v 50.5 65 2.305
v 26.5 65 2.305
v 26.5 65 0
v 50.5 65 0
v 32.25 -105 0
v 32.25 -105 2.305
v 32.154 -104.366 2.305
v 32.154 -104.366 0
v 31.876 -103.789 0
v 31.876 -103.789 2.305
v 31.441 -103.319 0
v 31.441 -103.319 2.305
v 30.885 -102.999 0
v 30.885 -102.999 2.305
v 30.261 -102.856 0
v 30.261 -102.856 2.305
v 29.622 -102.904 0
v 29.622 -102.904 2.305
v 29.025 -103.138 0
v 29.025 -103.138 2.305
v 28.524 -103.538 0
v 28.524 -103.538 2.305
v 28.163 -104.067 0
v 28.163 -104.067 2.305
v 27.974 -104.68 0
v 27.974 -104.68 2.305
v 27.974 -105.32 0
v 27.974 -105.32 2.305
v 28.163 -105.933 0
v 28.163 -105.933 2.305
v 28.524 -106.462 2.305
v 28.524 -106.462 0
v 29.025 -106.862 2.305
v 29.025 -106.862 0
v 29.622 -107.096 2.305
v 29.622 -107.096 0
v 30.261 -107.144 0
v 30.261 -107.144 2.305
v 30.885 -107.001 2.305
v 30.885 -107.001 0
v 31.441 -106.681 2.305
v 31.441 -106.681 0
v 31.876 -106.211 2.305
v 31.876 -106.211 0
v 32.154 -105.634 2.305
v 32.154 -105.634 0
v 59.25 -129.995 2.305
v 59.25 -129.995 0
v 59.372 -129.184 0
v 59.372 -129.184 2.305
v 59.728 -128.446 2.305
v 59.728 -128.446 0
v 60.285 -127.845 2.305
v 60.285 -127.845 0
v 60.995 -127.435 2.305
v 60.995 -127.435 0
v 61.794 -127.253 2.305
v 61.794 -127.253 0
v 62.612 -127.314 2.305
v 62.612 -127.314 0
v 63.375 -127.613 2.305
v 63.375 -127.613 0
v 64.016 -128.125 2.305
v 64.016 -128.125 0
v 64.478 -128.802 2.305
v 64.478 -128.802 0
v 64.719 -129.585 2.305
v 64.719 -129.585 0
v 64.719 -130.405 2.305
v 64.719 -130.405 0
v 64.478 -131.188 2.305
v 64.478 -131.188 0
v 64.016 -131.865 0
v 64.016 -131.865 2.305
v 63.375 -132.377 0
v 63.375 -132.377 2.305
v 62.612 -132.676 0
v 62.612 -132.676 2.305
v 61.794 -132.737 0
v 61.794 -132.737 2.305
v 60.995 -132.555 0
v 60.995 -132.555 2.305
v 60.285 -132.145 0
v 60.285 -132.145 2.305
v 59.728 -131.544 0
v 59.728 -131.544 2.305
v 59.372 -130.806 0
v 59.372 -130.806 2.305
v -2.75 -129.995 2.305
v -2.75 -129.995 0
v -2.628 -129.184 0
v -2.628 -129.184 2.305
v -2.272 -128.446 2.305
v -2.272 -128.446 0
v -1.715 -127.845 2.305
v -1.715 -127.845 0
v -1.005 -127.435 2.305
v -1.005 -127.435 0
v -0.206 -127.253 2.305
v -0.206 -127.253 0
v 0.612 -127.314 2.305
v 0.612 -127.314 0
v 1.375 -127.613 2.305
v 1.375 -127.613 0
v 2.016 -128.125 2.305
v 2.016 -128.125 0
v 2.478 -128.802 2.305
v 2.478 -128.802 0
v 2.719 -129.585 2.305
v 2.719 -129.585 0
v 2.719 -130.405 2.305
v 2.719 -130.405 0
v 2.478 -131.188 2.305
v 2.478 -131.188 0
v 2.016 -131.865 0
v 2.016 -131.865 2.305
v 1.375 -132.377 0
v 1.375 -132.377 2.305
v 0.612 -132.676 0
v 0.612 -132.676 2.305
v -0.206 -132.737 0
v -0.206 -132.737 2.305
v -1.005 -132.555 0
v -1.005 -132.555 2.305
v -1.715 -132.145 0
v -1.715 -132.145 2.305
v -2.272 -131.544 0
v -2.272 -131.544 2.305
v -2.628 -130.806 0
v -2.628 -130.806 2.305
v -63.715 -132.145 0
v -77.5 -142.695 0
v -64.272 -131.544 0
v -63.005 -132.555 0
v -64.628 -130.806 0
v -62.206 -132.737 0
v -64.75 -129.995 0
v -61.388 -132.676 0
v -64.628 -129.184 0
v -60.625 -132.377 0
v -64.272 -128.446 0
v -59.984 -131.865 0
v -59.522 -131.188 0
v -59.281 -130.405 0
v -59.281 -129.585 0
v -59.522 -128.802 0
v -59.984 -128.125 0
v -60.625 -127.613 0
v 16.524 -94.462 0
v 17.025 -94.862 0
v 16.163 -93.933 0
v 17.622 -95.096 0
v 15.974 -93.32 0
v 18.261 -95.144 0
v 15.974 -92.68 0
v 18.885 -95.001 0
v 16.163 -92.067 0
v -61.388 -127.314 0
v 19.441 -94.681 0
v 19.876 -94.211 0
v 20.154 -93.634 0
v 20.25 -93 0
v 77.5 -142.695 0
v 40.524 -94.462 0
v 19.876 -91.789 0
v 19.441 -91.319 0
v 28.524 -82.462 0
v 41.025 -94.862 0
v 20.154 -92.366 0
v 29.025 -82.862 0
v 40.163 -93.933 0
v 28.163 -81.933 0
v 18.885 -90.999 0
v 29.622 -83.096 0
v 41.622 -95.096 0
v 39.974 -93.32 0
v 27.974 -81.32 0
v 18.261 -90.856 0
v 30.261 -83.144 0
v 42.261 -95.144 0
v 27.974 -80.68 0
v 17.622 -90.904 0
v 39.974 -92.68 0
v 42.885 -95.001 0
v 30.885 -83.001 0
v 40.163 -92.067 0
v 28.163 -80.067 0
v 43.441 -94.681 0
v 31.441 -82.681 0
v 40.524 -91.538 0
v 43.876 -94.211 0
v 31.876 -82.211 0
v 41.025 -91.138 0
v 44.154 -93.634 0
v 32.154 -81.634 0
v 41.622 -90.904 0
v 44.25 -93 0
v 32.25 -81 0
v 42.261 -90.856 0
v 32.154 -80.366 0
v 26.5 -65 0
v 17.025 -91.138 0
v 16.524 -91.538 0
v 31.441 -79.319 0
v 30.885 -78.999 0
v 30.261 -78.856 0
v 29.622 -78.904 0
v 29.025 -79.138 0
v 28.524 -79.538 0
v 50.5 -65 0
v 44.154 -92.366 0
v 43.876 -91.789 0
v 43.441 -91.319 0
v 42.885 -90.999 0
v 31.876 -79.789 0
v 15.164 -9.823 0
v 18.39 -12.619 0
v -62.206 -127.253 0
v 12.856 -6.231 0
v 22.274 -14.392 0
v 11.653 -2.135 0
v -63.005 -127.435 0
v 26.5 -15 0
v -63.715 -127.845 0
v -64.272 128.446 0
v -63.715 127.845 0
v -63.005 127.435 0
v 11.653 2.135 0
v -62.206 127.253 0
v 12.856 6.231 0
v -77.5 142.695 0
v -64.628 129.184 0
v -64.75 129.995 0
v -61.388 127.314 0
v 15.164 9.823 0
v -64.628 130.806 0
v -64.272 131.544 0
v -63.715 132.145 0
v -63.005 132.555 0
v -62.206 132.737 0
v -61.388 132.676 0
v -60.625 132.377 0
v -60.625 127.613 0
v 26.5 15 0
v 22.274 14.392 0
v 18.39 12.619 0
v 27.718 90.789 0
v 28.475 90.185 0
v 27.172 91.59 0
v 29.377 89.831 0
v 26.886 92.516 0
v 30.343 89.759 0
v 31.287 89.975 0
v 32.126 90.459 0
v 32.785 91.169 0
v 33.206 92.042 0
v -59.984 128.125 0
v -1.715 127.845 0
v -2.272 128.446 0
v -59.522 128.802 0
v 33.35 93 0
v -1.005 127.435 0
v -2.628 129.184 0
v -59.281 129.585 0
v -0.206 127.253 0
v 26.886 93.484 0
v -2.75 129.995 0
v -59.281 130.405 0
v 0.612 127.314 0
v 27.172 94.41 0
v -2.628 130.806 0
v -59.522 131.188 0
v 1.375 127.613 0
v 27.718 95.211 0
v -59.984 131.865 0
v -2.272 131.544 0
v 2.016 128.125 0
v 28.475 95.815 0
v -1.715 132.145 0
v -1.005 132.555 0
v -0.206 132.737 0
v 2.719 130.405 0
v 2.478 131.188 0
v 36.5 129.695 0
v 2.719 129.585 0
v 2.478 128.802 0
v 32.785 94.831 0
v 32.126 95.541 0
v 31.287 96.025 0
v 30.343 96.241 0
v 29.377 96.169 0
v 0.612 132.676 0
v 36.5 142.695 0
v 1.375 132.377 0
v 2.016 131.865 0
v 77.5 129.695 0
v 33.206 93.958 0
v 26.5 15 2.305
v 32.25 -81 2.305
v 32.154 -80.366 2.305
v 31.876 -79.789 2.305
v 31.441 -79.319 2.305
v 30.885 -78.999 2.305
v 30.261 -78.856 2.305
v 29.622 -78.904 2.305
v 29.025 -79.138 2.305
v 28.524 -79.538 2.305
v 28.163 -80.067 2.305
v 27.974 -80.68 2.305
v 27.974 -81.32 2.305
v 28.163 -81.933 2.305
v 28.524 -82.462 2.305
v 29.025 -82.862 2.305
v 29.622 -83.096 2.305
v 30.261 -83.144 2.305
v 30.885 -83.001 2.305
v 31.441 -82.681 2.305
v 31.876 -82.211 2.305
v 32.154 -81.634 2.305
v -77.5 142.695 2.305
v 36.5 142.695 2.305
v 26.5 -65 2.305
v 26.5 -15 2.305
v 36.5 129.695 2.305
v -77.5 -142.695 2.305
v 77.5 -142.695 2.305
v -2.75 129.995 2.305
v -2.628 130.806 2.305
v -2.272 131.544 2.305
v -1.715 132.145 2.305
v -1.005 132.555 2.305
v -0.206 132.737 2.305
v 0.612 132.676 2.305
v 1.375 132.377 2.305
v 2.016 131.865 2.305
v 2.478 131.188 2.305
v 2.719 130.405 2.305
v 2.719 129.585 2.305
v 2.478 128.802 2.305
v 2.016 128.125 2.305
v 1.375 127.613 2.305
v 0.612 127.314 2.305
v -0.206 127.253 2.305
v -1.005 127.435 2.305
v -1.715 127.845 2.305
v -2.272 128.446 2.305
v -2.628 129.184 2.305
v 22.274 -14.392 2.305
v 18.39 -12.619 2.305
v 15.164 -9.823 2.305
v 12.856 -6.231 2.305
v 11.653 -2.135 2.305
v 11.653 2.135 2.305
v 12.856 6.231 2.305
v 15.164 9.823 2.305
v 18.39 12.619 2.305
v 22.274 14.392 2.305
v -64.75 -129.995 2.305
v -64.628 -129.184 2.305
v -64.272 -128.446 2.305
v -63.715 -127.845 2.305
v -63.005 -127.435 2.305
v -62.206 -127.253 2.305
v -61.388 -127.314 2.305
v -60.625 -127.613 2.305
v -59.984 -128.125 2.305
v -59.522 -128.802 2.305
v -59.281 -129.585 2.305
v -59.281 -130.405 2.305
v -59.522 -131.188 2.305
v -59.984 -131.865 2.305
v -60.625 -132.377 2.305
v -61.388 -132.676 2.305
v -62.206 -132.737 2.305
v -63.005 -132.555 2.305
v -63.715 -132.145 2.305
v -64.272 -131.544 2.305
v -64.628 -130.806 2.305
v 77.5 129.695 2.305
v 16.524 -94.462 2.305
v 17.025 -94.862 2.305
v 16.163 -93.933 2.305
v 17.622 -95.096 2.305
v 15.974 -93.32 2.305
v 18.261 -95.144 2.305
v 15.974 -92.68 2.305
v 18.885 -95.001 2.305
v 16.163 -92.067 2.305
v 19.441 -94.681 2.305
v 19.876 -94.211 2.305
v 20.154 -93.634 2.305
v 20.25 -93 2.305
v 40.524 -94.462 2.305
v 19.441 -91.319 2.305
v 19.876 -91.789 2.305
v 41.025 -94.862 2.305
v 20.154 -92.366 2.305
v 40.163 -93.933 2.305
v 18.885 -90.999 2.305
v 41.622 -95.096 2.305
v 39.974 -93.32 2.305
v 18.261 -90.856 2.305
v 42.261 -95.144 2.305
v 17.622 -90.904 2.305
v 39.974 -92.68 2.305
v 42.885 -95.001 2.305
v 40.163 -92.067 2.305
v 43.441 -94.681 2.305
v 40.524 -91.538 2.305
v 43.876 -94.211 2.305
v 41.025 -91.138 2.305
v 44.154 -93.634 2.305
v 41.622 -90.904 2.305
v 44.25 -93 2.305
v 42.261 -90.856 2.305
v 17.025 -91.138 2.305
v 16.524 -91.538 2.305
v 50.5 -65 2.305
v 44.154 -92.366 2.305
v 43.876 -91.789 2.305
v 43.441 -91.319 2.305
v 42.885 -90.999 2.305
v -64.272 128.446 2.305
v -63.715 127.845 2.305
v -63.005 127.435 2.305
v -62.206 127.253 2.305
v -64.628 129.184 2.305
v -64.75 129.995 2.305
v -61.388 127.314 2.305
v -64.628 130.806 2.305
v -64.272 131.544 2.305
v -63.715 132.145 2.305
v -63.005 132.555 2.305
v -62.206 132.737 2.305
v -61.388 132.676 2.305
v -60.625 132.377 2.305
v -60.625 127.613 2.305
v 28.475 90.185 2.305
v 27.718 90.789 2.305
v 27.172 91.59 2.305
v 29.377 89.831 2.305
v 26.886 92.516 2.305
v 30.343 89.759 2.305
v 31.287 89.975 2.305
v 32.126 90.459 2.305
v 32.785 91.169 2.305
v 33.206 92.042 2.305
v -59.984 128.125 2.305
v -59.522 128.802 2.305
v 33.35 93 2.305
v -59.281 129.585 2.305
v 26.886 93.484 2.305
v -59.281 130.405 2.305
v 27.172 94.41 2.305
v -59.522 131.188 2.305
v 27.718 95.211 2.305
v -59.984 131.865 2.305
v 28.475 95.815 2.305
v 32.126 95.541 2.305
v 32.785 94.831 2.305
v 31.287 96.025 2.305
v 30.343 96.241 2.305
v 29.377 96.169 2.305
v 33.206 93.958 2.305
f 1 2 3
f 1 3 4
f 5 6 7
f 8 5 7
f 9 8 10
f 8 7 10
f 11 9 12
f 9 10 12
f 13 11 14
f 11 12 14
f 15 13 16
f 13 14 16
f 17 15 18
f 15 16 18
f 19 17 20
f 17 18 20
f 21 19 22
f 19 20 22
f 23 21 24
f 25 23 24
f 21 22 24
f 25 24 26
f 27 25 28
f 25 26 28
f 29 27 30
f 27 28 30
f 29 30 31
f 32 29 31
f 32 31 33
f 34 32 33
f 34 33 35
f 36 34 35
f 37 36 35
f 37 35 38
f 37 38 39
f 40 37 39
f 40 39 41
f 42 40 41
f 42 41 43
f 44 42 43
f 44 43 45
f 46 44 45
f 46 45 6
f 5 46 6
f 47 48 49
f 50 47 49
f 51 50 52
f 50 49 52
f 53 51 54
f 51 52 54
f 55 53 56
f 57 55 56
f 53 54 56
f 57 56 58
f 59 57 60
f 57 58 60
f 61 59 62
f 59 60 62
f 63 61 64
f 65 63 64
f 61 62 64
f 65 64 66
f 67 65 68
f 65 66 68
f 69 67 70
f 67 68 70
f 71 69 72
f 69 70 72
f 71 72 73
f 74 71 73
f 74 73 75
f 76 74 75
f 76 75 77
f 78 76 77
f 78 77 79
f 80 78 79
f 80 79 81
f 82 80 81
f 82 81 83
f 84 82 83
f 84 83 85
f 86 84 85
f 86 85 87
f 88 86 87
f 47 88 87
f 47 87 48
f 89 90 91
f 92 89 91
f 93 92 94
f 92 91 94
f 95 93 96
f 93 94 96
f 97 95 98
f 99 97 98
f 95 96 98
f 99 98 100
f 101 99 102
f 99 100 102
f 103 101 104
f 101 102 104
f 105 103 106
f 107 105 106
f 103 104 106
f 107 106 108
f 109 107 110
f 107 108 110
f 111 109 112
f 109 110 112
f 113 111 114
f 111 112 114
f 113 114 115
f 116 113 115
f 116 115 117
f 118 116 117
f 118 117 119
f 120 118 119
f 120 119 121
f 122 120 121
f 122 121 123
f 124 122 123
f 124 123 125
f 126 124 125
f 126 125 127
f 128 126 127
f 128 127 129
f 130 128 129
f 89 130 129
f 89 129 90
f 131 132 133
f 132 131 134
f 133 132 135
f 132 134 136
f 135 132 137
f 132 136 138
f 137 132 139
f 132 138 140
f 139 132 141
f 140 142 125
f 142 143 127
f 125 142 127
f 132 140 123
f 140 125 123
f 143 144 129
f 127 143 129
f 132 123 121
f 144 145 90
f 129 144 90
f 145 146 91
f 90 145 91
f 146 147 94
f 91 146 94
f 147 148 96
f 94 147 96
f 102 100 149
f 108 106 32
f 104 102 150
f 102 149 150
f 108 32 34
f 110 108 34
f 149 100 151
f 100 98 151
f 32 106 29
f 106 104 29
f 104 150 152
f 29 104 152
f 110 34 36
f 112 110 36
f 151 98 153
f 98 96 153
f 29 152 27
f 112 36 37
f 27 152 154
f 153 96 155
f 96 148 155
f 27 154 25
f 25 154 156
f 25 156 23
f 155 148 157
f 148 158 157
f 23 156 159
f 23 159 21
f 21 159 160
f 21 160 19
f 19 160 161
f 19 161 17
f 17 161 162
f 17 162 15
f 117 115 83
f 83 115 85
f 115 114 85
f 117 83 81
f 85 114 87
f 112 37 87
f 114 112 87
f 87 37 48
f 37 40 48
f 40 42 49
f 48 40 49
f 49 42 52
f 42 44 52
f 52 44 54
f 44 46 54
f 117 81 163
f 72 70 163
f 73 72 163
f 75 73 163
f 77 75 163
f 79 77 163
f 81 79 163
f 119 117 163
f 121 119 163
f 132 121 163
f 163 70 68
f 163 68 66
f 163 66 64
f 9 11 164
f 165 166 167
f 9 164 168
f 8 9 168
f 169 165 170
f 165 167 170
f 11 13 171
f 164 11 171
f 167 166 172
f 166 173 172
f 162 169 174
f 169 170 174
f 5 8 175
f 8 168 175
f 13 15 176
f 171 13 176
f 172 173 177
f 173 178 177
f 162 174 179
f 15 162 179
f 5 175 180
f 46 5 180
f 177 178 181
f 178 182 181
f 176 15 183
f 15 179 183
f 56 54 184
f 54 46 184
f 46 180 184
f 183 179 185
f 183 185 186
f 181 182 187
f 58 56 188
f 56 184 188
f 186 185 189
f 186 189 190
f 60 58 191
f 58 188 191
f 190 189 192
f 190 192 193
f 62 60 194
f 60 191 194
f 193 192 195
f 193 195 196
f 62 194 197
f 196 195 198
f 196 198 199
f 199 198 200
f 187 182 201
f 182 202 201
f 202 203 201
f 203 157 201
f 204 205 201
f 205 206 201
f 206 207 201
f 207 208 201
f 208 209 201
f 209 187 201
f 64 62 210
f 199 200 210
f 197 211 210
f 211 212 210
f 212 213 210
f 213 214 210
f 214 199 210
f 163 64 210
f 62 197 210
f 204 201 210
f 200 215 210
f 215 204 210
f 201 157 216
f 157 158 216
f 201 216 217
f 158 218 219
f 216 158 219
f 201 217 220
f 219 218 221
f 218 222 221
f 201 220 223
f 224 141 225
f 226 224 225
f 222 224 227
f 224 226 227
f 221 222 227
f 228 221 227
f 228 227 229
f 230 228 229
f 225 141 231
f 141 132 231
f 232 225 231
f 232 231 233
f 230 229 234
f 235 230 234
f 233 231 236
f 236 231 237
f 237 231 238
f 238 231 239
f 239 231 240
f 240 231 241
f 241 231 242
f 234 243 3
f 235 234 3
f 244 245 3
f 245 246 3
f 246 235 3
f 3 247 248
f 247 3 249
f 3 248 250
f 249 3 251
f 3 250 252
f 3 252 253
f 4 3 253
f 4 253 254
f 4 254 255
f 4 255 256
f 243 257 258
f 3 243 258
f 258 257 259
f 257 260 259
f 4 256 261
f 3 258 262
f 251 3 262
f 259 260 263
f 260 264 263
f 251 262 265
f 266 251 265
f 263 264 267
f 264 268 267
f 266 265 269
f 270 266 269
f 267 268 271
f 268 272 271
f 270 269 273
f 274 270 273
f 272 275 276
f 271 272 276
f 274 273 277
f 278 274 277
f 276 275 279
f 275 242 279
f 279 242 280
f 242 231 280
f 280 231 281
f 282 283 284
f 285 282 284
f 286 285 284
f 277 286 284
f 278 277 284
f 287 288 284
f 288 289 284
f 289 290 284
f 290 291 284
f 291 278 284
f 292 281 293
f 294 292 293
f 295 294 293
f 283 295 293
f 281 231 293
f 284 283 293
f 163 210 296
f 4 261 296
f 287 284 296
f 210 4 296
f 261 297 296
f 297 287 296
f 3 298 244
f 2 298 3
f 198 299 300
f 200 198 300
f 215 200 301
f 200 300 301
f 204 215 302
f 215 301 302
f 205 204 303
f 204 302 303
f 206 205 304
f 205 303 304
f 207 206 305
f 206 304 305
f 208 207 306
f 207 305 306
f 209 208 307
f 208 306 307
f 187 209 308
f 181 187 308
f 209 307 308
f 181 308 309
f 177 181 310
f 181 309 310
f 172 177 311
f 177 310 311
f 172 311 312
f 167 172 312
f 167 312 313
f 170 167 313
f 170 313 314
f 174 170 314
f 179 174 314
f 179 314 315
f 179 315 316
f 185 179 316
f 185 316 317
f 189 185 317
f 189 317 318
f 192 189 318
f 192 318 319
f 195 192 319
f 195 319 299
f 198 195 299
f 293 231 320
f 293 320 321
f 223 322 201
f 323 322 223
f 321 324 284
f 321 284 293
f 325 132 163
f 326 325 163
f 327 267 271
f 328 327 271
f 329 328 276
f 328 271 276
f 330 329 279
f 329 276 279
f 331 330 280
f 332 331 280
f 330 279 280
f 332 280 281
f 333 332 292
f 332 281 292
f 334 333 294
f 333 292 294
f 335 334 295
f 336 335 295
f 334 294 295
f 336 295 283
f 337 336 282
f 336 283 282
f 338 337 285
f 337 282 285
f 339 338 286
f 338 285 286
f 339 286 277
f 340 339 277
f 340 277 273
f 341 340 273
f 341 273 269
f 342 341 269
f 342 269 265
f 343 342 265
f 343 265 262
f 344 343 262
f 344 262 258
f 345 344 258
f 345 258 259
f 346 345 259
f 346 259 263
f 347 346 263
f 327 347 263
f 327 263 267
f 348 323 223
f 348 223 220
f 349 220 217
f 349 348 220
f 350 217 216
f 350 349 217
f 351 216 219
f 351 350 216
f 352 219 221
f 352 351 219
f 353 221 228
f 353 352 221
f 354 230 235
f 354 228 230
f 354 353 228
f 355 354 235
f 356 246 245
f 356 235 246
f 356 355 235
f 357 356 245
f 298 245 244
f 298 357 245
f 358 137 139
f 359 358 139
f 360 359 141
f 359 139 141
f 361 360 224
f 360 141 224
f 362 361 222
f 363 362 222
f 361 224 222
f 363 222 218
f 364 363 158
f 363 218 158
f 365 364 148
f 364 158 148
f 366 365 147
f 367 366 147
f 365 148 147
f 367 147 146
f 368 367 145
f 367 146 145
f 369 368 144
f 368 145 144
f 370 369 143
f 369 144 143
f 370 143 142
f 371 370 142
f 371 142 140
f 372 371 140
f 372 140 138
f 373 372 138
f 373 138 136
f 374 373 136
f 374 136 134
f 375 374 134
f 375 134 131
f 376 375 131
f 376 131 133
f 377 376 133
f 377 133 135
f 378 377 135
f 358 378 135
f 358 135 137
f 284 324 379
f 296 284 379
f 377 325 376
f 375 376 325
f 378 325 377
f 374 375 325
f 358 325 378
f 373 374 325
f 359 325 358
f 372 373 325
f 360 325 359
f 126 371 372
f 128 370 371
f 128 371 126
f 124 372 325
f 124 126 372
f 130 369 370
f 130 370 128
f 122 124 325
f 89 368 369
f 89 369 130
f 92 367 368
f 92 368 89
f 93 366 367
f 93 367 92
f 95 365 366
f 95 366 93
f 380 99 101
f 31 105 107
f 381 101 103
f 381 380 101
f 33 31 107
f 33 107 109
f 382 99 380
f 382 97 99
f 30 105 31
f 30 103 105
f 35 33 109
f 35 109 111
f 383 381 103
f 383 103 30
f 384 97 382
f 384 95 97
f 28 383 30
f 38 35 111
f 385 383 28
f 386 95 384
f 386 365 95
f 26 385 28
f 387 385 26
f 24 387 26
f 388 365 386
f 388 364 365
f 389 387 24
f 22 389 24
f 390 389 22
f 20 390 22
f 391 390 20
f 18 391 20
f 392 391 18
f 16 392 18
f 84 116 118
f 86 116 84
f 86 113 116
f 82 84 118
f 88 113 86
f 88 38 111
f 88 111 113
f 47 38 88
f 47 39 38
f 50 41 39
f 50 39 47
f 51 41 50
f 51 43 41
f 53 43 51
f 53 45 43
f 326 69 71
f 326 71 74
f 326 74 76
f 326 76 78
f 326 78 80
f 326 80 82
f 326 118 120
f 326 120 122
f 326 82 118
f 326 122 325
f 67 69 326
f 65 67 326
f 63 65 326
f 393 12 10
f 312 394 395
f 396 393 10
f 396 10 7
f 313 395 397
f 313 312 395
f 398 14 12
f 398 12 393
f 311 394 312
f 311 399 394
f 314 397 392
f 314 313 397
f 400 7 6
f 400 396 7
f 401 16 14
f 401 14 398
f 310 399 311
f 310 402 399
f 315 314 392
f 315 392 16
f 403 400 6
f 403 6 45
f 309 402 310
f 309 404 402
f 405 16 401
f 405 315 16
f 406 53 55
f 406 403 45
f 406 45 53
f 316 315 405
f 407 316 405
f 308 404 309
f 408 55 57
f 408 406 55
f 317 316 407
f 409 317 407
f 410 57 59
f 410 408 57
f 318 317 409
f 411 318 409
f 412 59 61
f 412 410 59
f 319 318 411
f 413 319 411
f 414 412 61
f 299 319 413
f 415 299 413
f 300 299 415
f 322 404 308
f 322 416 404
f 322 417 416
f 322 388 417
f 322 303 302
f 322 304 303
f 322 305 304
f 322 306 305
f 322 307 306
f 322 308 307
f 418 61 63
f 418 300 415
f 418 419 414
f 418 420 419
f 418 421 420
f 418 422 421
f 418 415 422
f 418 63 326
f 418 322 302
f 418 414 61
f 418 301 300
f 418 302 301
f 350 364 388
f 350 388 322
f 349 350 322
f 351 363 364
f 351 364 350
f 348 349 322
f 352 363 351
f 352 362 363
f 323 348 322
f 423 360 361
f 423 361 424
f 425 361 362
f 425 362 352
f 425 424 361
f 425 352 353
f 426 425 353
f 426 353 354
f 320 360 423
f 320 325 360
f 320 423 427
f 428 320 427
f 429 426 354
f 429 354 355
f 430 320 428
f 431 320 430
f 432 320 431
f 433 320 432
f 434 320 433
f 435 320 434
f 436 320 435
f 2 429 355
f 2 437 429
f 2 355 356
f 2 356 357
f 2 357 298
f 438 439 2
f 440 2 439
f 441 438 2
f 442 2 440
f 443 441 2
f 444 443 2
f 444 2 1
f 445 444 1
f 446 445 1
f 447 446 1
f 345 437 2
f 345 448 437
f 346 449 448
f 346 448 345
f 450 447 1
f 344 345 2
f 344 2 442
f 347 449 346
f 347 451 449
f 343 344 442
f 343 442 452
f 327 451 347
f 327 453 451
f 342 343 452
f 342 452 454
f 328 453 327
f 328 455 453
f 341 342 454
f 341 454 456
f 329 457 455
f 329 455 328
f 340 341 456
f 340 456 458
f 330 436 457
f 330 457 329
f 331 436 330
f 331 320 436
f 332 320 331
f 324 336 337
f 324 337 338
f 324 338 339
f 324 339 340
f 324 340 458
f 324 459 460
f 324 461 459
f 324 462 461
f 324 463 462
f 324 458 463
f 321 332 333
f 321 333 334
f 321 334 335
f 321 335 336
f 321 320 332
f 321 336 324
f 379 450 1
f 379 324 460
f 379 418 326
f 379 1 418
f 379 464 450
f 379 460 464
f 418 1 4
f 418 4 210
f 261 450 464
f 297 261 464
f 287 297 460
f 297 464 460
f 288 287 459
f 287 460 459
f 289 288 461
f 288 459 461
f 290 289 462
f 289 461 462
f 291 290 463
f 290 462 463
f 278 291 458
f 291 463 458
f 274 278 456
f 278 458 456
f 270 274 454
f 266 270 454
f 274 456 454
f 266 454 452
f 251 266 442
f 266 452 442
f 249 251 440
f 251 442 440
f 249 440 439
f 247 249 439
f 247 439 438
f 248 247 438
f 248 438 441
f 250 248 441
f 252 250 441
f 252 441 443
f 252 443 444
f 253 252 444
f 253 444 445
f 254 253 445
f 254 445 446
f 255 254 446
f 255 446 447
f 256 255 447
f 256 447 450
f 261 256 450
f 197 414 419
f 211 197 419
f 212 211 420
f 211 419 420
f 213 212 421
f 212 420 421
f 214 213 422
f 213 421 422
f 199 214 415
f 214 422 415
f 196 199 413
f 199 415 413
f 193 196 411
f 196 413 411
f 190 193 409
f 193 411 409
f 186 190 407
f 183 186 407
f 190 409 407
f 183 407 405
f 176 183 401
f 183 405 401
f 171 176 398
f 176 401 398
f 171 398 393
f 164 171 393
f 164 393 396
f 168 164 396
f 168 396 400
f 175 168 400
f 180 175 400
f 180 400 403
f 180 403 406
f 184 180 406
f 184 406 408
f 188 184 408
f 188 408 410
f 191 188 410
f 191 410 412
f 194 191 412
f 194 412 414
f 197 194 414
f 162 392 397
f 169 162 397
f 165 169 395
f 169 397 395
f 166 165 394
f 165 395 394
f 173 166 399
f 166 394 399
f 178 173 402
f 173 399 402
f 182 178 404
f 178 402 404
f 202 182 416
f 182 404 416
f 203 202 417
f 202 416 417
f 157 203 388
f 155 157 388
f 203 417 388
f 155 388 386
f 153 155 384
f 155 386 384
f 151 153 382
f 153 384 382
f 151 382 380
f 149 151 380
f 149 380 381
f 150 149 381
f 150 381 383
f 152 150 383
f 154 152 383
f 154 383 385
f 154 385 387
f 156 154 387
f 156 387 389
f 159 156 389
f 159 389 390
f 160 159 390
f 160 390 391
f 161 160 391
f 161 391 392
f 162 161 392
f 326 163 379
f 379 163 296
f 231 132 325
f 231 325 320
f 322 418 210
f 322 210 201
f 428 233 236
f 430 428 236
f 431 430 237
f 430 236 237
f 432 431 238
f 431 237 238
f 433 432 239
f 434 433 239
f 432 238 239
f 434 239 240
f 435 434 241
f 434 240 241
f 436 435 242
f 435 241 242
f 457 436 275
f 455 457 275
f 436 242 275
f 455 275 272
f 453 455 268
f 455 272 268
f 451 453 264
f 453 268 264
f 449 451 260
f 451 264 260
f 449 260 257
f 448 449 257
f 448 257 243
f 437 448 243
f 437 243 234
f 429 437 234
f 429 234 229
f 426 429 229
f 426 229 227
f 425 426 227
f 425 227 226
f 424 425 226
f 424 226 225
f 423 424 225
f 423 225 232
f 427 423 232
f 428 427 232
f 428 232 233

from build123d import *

# Parameters (mm, degrees)
SKETCH1_W            = 155
SKETCH1_H            = 285.39
BOSS_EXTRUDE1_DEPTH  = 2.305
M5_CLEARANCE_HOLE1_D = 5.5
SKETCH4_R            = 2.15
SKETCH4_R_2          = 3.25
CUT_EXTRUDE1_DEPTH   = 3.305
SKETCH5_W            = 41
SKETCH5_H            = 13
CUT_EXTRUDE2_DEPTH   = 10
CUT_EXTRUDE3_DEPTH   = 3.305


with BuildPart() as part:
    # Sketch1 → Boss-Extrude1 (new body)
    with BuildSketch(Plane.XY):
        Rectangle(SKETCH1_W, SKETCH1_H)
    extrude(amount=BOSS_EXTRUDE1_DEPTH)

    # M5 Clearance Hole1 (through all)
    with Locations(Plane.XY.offset(2.305)):
        with Locations((-62, 129.995), (0, 129.995), (-62, -129.995), (0, -129.995), (62, -129.995)):
            Hole(M5_CLEARANCE_HOLE1_D / 2)

    # Sketch4 → Cut-Extrude1 (cut, through all)
    with BuildSketch(Plane.XY.offset(2.305)):
        with Locations((30.1, -81)):
            Circle(SKETCH4_R)
        with Locations((42.1, -93)):
            Circle(SKETCH4_R)
        with Locations((30.1, -105)):
            Circle(SKETCH4_R)
        with Locations((18.1, -93)):
            Circle(SKETCH4_R)
        with Locations((30.1, 93)):
            Circle(SKETCH4_R_2)
    extrude(amount=-CUT_EXTRUDE1_DEPTH, mode=Mode.SUBTRACT)

    # Sketch5 → Cut-Extrude2 (cut)
    with BuildSketch(Plane.XY.offset(2.305)):
        with Locations((57, 136.195)):
            Rectangle(SKETCH5_W, SKETCH5_H)
    extrude(amount=-CUT_EXTRUDE2_DEPTH, mode=Mode.SUBTRACT)

    # Sketch6 → Cut-Extrude3 (cut, through all)
    with BuildSketch(Plane.XY.offset(2.305)):
        with BuildLine():
            Line((26.5, 65), (50.5, 65))
            Line((50.5, 65), (50.5, -65))
            Line((50.5, -65), (26.5, -65))
            Line((26.5, -65), (26.5, -15))
            ThreePointArc((26.5, -15), (11.5, 0), (26.5, 15))
            Line((26.5, 15), (26.5, 65))
        make_face()
    extrude(amount=-CUT_EXTRUDE3_DEPTH, mode=Mode.SUBTRACT)


solid = part.part
